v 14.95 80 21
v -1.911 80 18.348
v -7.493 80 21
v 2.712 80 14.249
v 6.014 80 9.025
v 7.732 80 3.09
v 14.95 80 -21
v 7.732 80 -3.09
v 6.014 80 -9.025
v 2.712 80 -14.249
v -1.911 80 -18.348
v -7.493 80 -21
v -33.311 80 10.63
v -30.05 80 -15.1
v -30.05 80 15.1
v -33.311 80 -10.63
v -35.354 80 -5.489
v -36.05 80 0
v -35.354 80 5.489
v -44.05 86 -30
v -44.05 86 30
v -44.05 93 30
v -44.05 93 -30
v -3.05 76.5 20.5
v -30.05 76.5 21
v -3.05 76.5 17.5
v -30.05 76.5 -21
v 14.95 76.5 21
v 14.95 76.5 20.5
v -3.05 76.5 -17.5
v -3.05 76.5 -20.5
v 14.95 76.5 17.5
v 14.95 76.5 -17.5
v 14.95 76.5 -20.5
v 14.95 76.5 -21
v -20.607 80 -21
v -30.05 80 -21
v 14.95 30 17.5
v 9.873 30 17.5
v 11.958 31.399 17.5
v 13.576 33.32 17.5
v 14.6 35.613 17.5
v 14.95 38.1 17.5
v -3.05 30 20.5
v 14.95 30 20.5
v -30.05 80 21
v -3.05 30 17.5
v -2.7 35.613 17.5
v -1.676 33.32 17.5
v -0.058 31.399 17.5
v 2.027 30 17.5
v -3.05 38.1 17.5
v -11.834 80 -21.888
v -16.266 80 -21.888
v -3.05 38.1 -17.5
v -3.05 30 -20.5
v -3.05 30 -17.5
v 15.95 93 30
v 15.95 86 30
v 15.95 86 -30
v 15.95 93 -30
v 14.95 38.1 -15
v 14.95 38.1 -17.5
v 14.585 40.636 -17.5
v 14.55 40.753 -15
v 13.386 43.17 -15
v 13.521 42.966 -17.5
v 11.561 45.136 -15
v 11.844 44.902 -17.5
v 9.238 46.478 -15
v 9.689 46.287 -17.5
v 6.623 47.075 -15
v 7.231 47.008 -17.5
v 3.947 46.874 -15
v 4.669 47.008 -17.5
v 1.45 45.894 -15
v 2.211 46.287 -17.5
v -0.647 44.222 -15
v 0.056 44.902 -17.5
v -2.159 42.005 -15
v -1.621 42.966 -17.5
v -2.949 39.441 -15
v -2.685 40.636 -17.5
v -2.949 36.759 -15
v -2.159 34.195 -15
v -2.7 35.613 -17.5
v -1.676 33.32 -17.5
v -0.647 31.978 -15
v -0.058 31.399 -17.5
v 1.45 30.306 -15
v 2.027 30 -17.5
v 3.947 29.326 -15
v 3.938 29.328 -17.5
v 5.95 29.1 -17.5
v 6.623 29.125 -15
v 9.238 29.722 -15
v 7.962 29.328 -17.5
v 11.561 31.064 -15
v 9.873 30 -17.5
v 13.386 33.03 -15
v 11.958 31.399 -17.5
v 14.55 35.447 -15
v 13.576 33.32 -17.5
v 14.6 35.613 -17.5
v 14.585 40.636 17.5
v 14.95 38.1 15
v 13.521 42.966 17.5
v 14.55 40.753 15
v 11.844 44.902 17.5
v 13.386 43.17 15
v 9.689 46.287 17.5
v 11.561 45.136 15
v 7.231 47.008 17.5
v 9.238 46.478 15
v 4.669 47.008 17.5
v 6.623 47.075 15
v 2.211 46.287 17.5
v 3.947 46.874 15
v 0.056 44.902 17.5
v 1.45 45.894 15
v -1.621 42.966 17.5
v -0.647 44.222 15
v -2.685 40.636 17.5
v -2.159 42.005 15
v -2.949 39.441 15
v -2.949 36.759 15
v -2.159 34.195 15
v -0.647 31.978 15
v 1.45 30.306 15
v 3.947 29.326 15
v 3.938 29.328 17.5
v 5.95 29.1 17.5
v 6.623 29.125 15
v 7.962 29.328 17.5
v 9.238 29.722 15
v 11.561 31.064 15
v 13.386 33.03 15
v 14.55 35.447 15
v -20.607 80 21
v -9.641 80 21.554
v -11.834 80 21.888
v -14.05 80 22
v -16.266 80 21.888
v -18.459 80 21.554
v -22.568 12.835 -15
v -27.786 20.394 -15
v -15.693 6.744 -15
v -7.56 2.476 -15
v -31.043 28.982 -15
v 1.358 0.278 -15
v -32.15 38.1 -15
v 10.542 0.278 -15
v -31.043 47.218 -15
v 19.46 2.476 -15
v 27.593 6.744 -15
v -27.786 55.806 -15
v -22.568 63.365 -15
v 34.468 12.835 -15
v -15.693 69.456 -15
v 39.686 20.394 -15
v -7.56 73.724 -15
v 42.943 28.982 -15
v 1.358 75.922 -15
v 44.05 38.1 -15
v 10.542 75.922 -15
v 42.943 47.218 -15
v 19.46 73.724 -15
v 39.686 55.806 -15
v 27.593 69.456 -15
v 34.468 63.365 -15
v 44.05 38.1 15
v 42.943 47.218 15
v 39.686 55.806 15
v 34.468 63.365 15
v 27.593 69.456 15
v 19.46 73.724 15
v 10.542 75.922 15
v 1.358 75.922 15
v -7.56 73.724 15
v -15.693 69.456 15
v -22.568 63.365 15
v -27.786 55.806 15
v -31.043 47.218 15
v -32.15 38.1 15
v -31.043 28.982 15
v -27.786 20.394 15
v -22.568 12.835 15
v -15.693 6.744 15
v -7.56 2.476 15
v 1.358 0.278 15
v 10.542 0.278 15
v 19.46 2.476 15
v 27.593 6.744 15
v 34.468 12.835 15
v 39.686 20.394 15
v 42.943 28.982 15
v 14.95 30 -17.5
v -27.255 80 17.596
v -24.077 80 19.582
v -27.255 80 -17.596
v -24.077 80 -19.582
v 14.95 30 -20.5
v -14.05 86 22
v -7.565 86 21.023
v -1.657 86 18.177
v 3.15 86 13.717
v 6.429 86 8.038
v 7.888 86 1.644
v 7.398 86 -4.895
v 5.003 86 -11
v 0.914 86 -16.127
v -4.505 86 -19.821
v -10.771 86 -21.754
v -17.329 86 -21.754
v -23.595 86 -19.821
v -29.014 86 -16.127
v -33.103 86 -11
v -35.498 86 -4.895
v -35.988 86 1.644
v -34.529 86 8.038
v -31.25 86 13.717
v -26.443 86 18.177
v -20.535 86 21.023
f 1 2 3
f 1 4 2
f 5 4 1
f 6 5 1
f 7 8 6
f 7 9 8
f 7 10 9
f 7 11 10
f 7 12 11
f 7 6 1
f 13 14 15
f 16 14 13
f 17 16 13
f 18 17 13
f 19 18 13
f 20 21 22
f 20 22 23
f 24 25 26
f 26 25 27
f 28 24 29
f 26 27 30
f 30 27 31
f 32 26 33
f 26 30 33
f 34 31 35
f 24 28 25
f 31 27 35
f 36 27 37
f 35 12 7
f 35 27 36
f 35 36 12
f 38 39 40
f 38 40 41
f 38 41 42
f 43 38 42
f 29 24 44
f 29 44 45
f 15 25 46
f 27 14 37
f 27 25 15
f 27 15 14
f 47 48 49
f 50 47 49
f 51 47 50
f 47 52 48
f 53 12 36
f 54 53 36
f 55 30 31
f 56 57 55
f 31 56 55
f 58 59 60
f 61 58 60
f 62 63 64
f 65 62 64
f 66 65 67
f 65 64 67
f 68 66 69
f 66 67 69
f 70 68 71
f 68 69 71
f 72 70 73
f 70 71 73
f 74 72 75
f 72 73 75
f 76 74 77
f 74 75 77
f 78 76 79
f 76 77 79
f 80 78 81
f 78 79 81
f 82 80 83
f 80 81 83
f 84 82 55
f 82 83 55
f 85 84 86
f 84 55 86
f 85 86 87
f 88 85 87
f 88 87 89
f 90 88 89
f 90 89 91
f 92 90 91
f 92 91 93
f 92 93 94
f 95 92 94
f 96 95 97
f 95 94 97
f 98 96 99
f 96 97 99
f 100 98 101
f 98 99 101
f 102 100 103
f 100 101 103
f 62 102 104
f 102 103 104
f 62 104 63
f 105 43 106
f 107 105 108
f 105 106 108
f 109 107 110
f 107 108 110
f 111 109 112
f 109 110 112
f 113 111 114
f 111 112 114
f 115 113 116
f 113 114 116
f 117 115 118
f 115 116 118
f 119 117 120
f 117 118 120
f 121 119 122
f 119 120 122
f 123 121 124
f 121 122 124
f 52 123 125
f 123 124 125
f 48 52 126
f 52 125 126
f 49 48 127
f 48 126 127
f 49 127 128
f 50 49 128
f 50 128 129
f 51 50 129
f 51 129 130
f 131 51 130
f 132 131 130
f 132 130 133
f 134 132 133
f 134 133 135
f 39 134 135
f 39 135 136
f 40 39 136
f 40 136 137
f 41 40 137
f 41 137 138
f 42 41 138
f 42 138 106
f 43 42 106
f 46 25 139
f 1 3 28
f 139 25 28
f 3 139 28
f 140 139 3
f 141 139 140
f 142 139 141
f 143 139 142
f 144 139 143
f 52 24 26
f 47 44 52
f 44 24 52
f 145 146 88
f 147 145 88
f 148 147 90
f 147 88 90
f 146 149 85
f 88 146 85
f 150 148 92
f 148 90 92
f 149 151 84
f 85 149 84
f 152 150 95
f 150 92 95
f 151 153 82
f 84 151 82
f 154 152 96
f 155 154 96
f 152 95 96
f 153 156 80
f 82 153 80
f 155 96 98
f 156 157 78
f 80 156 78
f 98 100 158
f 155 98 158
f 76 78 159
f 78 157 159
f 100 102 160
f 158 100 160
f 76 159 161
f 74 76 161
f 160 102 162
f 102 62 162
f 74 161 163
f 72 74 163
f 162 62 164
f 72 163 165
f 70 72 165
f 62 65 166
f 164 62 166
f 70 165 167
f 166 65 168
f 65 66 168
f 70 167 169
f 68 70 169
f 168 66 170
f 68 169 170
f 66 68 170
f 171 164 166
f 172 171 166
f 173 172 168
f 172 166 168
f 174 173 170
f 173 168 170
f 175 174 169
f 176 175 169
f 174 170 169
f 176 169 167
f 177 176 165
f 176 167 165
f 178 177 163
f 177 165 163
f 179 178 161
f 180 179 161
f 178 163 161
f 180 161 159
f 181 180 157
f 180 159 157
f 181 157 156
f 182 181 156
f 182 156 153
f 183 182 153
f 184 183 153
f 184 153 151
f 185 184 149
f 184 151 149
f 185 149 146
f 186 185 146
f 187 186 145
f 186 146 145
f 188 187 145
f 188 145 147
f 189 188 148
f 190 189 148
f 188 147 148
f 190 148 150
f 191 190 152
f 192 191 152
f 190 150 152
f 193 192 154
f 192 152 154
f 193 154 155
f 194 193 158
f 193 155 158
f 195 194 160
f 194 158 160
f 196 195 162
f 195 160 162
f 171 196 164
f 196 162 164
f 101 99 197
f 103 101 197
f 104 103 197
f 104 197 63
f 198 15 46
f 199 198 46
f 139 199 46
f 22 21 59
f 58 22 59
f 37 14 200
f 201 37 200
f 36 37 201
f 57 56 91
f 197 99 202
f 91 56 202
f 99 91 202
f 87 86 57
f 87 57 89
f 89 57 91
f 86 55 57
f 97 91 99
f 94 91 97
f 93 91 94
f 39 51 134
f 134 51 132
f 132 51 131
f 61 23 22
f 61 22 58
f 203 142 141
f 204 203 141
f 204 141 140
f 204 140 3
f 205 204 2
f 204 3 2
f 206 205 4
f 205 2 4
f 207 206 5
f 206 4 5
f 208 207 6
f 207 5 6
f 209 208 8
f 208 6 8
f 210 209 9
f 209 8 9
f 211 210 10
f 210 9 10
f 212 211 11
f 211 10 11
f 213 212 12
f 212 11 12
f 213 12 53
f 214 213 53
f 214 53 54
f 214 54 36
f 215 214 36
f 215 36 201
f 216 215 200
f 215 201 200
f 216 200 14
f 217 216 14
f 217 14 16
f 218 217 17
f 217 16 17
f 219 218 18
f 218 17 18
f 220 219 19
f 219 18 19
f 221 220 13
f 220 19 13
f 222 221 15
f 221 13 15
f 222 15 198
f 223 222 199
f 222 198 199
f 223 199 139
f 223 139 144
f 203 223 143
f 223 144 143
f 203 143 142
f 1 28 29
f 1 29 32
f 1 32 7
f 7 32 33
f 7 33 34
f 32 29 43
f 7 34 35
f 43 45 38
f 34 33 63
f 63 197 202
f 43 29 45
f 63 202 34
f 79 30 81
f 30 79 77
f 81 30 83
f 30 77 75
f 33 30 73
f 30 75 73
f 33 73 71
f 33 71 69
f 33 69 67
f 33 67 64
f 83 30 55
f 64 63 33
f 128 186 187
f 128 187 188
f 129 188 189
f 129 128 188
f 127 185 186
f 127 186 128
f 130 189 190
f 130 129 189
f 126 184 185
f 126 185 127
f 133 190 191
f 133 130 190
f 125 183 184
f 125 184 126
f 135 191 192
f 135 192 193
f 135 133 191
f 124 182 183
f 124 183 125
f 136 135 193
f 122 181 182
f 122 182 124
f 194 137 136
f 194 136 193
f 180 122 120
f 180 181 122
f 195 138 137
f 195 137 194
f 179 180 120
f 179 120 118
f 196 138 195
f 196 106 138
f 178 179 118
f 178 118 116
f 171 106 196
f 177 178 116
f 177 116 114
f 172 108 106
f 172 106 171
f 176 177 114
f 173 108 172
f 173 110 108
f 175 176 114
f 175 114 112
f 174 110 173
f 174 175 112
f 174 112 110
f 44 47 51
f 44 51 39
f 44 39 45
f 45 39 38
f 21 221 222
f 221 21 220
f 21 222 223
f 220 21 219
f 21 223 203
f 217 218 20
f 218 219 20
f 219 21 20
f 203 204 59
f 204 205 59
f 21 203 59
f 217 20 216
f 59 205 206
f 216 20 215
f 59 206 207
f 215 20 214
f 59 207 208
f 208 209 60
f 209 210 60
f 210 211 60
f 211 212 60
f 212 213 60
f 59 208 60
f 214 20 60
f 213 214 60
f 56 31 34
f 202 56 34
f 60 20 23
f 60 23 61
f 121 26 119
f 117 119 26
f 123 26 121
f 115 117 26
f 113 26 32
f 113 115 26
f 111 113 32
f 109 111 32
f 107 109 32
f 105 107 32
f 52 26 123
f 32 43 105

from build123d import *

# Parameters (mm, degrees)
P01_SPACER4MM_START  = 89
SK_P01_SPACER4MM_W   = 60
SK_P01_SPACER4MM_H   = 60
P01_SPACER4MM_DEPTH  = 4
P02_TOPPLATE_START   = 86
SK_P02_TOPPLATE_W    = 60
SK_P02_TOPPLATE_H    = 60
P02_TOPPLATE_DEPTH   = 3
P03_SWIVELRACE_START = 80
SK_P03_SWIVELRACE_R  = 22
P03_SWIVELRACE_DEPTH = 6
P04_FORKYOKE_START   = 76.5
SK_P04_FORKYOKE_W    = 45
SK_P04_FORKYOKE_H    = 42
P04_FORKYOKE_DEPTH   = 3.5
P05_FORKLEG_START    = 30
SK_P05_FORKLEG_W     = 18
SK_P05_FORKLEG_H     = 3
P05_FORKLEG_DEPTH    = 48
P06_FORKLEG_START    = 30
SK_P06_FORKLEG_W     = 18
SK_P06_FORKLEG_H     = 3
P06_FORKLEG_DEPTH    = 48
P07_WHEEL3IN_START   = -15
SK_P07_WHEEL3IN_R    = 38.1
P07_WHEEL3IN_DEPTH   = 30
P08_AXLE_START       = -17.5
SK_P08_AXLE_R        = 9
P08_AXLE_DEPTH       = 35


with BuildPart() as part:
    # SK_P01_Spacer4mm → P01_Spacer4mm (new body)
    with BuildSketch(Plane(origin=(0, 0, 0), x_dir=(1, 0, 0), z_dir=(0, 1, 0)).offset(P01_SPACER4MM_START)):
        with Locations((-14.05, 0)):
            Rectangle(SK_P01_SPACER4MM_W, SK_P01_SPACER4MM_H)
    extrude(amount=P01_SPACER4MM_DEPTH)

    # SK_P02_Topplate → P02_Topplate (add)
    with BuildSketch(Plane(origin=(0, 0, 0), x_dir=(1, 0, 0), z_dir=(0, 1, 0)).offset(P02_TOPPLATE_START)):
        with Locations((-14.05, 0)):
            Rectangle(SK_P02_TOPPLATE_W, SK_P02_TOPPLATE_H)
    extrude(amount=P02_TOPPLATE_DEPTH)

    # SK_P03_Swivelrace → P03_Swivelrace (add)
    with BuildSketch(Plane(origin=(0, 0, 0), x_dir=(1, 0, 0), z_dir=(0, 1, 0)).offset(P03_SWIVELRACE_START)):
        with Locations(Location((-14.05, 0, 0), (0, 0, 270))):
            Circle(SK_P03_SWIVELRACE_R)
    extrude(amount=P03_SWIVELRACE_DEPTH)

    # SK_P04_Forkyoke → P04_Forkyoke (add)
    with BuildSketch(Plane(origin=(0, 0, 0), x_dir=(1, 0, 0), z_dir=(0, 1, 0)).offset(P04_FORKYOKE_START)):
        with Locations((-7.55, 0)):
            Rectangle(SK_P04_FORKYOKE_W, SK_P04_FORKYOKE_H)
    extrude(amount=P04_FORKYOKE_DEPTH)

    # SK_P05_Forkleg → P05_Forkleg (add)
    with BuildSketch(Plane(origin=(0, 0, 0), x_dir=(1, 0, 0), z_dir=(0, 1, 0)).offset(P05_FORKLEG_START)):
        with Locations((5.95, 19)):
            Rectangle(SK_P05_FORKLEG_W, SK_P05_FORKLEG_H)
    extrude(amount=P05_FORKLEG_DEPTH)

    # SK_P06_Forkleg → P06_Forkleg (add)
    with BuildSketch(Plane(origin=(0, 0, 0), x_dir=(1, 0, 0), z_dir=(0, 1, 0)).offset(P06_FORKLEG_START)):
        with Locations((5.95, -19)):
            Rectangle(SK_P06_FORKLEG_W, SK_P06_FORKLEG_H)
    extrude(amount=P06_FORKLEG_DEPTH)



with BuildPart() as body_2:
    # SK_P07_Wheel3in → P07_Wheel3in (new body)
    with BuildSketch(Plane.XY.offset(P07_WHEEL3IN_START)):
        with Locations((5.95, 38.1)):
            Circle(SK_P07_WHEEL3IN_R)
    extrude(amount=P07_WHEEL3IN_DEPTH)


with BuildPart() as part_1:
    add(part.part)

    add(body_2.part)  # P08_Axle merges body 2
    # SK_P08_Axle → P08_Axle (add)
    with BuildSketch(Plane.XY.offset(P08_AXLE_START)):
        with Locations((5.95, 38.1)):
            Circle(SK_P08_AXLE_R)
    extrude(amount=P08_AXLE_DEPTH)


solid = part_1.part
